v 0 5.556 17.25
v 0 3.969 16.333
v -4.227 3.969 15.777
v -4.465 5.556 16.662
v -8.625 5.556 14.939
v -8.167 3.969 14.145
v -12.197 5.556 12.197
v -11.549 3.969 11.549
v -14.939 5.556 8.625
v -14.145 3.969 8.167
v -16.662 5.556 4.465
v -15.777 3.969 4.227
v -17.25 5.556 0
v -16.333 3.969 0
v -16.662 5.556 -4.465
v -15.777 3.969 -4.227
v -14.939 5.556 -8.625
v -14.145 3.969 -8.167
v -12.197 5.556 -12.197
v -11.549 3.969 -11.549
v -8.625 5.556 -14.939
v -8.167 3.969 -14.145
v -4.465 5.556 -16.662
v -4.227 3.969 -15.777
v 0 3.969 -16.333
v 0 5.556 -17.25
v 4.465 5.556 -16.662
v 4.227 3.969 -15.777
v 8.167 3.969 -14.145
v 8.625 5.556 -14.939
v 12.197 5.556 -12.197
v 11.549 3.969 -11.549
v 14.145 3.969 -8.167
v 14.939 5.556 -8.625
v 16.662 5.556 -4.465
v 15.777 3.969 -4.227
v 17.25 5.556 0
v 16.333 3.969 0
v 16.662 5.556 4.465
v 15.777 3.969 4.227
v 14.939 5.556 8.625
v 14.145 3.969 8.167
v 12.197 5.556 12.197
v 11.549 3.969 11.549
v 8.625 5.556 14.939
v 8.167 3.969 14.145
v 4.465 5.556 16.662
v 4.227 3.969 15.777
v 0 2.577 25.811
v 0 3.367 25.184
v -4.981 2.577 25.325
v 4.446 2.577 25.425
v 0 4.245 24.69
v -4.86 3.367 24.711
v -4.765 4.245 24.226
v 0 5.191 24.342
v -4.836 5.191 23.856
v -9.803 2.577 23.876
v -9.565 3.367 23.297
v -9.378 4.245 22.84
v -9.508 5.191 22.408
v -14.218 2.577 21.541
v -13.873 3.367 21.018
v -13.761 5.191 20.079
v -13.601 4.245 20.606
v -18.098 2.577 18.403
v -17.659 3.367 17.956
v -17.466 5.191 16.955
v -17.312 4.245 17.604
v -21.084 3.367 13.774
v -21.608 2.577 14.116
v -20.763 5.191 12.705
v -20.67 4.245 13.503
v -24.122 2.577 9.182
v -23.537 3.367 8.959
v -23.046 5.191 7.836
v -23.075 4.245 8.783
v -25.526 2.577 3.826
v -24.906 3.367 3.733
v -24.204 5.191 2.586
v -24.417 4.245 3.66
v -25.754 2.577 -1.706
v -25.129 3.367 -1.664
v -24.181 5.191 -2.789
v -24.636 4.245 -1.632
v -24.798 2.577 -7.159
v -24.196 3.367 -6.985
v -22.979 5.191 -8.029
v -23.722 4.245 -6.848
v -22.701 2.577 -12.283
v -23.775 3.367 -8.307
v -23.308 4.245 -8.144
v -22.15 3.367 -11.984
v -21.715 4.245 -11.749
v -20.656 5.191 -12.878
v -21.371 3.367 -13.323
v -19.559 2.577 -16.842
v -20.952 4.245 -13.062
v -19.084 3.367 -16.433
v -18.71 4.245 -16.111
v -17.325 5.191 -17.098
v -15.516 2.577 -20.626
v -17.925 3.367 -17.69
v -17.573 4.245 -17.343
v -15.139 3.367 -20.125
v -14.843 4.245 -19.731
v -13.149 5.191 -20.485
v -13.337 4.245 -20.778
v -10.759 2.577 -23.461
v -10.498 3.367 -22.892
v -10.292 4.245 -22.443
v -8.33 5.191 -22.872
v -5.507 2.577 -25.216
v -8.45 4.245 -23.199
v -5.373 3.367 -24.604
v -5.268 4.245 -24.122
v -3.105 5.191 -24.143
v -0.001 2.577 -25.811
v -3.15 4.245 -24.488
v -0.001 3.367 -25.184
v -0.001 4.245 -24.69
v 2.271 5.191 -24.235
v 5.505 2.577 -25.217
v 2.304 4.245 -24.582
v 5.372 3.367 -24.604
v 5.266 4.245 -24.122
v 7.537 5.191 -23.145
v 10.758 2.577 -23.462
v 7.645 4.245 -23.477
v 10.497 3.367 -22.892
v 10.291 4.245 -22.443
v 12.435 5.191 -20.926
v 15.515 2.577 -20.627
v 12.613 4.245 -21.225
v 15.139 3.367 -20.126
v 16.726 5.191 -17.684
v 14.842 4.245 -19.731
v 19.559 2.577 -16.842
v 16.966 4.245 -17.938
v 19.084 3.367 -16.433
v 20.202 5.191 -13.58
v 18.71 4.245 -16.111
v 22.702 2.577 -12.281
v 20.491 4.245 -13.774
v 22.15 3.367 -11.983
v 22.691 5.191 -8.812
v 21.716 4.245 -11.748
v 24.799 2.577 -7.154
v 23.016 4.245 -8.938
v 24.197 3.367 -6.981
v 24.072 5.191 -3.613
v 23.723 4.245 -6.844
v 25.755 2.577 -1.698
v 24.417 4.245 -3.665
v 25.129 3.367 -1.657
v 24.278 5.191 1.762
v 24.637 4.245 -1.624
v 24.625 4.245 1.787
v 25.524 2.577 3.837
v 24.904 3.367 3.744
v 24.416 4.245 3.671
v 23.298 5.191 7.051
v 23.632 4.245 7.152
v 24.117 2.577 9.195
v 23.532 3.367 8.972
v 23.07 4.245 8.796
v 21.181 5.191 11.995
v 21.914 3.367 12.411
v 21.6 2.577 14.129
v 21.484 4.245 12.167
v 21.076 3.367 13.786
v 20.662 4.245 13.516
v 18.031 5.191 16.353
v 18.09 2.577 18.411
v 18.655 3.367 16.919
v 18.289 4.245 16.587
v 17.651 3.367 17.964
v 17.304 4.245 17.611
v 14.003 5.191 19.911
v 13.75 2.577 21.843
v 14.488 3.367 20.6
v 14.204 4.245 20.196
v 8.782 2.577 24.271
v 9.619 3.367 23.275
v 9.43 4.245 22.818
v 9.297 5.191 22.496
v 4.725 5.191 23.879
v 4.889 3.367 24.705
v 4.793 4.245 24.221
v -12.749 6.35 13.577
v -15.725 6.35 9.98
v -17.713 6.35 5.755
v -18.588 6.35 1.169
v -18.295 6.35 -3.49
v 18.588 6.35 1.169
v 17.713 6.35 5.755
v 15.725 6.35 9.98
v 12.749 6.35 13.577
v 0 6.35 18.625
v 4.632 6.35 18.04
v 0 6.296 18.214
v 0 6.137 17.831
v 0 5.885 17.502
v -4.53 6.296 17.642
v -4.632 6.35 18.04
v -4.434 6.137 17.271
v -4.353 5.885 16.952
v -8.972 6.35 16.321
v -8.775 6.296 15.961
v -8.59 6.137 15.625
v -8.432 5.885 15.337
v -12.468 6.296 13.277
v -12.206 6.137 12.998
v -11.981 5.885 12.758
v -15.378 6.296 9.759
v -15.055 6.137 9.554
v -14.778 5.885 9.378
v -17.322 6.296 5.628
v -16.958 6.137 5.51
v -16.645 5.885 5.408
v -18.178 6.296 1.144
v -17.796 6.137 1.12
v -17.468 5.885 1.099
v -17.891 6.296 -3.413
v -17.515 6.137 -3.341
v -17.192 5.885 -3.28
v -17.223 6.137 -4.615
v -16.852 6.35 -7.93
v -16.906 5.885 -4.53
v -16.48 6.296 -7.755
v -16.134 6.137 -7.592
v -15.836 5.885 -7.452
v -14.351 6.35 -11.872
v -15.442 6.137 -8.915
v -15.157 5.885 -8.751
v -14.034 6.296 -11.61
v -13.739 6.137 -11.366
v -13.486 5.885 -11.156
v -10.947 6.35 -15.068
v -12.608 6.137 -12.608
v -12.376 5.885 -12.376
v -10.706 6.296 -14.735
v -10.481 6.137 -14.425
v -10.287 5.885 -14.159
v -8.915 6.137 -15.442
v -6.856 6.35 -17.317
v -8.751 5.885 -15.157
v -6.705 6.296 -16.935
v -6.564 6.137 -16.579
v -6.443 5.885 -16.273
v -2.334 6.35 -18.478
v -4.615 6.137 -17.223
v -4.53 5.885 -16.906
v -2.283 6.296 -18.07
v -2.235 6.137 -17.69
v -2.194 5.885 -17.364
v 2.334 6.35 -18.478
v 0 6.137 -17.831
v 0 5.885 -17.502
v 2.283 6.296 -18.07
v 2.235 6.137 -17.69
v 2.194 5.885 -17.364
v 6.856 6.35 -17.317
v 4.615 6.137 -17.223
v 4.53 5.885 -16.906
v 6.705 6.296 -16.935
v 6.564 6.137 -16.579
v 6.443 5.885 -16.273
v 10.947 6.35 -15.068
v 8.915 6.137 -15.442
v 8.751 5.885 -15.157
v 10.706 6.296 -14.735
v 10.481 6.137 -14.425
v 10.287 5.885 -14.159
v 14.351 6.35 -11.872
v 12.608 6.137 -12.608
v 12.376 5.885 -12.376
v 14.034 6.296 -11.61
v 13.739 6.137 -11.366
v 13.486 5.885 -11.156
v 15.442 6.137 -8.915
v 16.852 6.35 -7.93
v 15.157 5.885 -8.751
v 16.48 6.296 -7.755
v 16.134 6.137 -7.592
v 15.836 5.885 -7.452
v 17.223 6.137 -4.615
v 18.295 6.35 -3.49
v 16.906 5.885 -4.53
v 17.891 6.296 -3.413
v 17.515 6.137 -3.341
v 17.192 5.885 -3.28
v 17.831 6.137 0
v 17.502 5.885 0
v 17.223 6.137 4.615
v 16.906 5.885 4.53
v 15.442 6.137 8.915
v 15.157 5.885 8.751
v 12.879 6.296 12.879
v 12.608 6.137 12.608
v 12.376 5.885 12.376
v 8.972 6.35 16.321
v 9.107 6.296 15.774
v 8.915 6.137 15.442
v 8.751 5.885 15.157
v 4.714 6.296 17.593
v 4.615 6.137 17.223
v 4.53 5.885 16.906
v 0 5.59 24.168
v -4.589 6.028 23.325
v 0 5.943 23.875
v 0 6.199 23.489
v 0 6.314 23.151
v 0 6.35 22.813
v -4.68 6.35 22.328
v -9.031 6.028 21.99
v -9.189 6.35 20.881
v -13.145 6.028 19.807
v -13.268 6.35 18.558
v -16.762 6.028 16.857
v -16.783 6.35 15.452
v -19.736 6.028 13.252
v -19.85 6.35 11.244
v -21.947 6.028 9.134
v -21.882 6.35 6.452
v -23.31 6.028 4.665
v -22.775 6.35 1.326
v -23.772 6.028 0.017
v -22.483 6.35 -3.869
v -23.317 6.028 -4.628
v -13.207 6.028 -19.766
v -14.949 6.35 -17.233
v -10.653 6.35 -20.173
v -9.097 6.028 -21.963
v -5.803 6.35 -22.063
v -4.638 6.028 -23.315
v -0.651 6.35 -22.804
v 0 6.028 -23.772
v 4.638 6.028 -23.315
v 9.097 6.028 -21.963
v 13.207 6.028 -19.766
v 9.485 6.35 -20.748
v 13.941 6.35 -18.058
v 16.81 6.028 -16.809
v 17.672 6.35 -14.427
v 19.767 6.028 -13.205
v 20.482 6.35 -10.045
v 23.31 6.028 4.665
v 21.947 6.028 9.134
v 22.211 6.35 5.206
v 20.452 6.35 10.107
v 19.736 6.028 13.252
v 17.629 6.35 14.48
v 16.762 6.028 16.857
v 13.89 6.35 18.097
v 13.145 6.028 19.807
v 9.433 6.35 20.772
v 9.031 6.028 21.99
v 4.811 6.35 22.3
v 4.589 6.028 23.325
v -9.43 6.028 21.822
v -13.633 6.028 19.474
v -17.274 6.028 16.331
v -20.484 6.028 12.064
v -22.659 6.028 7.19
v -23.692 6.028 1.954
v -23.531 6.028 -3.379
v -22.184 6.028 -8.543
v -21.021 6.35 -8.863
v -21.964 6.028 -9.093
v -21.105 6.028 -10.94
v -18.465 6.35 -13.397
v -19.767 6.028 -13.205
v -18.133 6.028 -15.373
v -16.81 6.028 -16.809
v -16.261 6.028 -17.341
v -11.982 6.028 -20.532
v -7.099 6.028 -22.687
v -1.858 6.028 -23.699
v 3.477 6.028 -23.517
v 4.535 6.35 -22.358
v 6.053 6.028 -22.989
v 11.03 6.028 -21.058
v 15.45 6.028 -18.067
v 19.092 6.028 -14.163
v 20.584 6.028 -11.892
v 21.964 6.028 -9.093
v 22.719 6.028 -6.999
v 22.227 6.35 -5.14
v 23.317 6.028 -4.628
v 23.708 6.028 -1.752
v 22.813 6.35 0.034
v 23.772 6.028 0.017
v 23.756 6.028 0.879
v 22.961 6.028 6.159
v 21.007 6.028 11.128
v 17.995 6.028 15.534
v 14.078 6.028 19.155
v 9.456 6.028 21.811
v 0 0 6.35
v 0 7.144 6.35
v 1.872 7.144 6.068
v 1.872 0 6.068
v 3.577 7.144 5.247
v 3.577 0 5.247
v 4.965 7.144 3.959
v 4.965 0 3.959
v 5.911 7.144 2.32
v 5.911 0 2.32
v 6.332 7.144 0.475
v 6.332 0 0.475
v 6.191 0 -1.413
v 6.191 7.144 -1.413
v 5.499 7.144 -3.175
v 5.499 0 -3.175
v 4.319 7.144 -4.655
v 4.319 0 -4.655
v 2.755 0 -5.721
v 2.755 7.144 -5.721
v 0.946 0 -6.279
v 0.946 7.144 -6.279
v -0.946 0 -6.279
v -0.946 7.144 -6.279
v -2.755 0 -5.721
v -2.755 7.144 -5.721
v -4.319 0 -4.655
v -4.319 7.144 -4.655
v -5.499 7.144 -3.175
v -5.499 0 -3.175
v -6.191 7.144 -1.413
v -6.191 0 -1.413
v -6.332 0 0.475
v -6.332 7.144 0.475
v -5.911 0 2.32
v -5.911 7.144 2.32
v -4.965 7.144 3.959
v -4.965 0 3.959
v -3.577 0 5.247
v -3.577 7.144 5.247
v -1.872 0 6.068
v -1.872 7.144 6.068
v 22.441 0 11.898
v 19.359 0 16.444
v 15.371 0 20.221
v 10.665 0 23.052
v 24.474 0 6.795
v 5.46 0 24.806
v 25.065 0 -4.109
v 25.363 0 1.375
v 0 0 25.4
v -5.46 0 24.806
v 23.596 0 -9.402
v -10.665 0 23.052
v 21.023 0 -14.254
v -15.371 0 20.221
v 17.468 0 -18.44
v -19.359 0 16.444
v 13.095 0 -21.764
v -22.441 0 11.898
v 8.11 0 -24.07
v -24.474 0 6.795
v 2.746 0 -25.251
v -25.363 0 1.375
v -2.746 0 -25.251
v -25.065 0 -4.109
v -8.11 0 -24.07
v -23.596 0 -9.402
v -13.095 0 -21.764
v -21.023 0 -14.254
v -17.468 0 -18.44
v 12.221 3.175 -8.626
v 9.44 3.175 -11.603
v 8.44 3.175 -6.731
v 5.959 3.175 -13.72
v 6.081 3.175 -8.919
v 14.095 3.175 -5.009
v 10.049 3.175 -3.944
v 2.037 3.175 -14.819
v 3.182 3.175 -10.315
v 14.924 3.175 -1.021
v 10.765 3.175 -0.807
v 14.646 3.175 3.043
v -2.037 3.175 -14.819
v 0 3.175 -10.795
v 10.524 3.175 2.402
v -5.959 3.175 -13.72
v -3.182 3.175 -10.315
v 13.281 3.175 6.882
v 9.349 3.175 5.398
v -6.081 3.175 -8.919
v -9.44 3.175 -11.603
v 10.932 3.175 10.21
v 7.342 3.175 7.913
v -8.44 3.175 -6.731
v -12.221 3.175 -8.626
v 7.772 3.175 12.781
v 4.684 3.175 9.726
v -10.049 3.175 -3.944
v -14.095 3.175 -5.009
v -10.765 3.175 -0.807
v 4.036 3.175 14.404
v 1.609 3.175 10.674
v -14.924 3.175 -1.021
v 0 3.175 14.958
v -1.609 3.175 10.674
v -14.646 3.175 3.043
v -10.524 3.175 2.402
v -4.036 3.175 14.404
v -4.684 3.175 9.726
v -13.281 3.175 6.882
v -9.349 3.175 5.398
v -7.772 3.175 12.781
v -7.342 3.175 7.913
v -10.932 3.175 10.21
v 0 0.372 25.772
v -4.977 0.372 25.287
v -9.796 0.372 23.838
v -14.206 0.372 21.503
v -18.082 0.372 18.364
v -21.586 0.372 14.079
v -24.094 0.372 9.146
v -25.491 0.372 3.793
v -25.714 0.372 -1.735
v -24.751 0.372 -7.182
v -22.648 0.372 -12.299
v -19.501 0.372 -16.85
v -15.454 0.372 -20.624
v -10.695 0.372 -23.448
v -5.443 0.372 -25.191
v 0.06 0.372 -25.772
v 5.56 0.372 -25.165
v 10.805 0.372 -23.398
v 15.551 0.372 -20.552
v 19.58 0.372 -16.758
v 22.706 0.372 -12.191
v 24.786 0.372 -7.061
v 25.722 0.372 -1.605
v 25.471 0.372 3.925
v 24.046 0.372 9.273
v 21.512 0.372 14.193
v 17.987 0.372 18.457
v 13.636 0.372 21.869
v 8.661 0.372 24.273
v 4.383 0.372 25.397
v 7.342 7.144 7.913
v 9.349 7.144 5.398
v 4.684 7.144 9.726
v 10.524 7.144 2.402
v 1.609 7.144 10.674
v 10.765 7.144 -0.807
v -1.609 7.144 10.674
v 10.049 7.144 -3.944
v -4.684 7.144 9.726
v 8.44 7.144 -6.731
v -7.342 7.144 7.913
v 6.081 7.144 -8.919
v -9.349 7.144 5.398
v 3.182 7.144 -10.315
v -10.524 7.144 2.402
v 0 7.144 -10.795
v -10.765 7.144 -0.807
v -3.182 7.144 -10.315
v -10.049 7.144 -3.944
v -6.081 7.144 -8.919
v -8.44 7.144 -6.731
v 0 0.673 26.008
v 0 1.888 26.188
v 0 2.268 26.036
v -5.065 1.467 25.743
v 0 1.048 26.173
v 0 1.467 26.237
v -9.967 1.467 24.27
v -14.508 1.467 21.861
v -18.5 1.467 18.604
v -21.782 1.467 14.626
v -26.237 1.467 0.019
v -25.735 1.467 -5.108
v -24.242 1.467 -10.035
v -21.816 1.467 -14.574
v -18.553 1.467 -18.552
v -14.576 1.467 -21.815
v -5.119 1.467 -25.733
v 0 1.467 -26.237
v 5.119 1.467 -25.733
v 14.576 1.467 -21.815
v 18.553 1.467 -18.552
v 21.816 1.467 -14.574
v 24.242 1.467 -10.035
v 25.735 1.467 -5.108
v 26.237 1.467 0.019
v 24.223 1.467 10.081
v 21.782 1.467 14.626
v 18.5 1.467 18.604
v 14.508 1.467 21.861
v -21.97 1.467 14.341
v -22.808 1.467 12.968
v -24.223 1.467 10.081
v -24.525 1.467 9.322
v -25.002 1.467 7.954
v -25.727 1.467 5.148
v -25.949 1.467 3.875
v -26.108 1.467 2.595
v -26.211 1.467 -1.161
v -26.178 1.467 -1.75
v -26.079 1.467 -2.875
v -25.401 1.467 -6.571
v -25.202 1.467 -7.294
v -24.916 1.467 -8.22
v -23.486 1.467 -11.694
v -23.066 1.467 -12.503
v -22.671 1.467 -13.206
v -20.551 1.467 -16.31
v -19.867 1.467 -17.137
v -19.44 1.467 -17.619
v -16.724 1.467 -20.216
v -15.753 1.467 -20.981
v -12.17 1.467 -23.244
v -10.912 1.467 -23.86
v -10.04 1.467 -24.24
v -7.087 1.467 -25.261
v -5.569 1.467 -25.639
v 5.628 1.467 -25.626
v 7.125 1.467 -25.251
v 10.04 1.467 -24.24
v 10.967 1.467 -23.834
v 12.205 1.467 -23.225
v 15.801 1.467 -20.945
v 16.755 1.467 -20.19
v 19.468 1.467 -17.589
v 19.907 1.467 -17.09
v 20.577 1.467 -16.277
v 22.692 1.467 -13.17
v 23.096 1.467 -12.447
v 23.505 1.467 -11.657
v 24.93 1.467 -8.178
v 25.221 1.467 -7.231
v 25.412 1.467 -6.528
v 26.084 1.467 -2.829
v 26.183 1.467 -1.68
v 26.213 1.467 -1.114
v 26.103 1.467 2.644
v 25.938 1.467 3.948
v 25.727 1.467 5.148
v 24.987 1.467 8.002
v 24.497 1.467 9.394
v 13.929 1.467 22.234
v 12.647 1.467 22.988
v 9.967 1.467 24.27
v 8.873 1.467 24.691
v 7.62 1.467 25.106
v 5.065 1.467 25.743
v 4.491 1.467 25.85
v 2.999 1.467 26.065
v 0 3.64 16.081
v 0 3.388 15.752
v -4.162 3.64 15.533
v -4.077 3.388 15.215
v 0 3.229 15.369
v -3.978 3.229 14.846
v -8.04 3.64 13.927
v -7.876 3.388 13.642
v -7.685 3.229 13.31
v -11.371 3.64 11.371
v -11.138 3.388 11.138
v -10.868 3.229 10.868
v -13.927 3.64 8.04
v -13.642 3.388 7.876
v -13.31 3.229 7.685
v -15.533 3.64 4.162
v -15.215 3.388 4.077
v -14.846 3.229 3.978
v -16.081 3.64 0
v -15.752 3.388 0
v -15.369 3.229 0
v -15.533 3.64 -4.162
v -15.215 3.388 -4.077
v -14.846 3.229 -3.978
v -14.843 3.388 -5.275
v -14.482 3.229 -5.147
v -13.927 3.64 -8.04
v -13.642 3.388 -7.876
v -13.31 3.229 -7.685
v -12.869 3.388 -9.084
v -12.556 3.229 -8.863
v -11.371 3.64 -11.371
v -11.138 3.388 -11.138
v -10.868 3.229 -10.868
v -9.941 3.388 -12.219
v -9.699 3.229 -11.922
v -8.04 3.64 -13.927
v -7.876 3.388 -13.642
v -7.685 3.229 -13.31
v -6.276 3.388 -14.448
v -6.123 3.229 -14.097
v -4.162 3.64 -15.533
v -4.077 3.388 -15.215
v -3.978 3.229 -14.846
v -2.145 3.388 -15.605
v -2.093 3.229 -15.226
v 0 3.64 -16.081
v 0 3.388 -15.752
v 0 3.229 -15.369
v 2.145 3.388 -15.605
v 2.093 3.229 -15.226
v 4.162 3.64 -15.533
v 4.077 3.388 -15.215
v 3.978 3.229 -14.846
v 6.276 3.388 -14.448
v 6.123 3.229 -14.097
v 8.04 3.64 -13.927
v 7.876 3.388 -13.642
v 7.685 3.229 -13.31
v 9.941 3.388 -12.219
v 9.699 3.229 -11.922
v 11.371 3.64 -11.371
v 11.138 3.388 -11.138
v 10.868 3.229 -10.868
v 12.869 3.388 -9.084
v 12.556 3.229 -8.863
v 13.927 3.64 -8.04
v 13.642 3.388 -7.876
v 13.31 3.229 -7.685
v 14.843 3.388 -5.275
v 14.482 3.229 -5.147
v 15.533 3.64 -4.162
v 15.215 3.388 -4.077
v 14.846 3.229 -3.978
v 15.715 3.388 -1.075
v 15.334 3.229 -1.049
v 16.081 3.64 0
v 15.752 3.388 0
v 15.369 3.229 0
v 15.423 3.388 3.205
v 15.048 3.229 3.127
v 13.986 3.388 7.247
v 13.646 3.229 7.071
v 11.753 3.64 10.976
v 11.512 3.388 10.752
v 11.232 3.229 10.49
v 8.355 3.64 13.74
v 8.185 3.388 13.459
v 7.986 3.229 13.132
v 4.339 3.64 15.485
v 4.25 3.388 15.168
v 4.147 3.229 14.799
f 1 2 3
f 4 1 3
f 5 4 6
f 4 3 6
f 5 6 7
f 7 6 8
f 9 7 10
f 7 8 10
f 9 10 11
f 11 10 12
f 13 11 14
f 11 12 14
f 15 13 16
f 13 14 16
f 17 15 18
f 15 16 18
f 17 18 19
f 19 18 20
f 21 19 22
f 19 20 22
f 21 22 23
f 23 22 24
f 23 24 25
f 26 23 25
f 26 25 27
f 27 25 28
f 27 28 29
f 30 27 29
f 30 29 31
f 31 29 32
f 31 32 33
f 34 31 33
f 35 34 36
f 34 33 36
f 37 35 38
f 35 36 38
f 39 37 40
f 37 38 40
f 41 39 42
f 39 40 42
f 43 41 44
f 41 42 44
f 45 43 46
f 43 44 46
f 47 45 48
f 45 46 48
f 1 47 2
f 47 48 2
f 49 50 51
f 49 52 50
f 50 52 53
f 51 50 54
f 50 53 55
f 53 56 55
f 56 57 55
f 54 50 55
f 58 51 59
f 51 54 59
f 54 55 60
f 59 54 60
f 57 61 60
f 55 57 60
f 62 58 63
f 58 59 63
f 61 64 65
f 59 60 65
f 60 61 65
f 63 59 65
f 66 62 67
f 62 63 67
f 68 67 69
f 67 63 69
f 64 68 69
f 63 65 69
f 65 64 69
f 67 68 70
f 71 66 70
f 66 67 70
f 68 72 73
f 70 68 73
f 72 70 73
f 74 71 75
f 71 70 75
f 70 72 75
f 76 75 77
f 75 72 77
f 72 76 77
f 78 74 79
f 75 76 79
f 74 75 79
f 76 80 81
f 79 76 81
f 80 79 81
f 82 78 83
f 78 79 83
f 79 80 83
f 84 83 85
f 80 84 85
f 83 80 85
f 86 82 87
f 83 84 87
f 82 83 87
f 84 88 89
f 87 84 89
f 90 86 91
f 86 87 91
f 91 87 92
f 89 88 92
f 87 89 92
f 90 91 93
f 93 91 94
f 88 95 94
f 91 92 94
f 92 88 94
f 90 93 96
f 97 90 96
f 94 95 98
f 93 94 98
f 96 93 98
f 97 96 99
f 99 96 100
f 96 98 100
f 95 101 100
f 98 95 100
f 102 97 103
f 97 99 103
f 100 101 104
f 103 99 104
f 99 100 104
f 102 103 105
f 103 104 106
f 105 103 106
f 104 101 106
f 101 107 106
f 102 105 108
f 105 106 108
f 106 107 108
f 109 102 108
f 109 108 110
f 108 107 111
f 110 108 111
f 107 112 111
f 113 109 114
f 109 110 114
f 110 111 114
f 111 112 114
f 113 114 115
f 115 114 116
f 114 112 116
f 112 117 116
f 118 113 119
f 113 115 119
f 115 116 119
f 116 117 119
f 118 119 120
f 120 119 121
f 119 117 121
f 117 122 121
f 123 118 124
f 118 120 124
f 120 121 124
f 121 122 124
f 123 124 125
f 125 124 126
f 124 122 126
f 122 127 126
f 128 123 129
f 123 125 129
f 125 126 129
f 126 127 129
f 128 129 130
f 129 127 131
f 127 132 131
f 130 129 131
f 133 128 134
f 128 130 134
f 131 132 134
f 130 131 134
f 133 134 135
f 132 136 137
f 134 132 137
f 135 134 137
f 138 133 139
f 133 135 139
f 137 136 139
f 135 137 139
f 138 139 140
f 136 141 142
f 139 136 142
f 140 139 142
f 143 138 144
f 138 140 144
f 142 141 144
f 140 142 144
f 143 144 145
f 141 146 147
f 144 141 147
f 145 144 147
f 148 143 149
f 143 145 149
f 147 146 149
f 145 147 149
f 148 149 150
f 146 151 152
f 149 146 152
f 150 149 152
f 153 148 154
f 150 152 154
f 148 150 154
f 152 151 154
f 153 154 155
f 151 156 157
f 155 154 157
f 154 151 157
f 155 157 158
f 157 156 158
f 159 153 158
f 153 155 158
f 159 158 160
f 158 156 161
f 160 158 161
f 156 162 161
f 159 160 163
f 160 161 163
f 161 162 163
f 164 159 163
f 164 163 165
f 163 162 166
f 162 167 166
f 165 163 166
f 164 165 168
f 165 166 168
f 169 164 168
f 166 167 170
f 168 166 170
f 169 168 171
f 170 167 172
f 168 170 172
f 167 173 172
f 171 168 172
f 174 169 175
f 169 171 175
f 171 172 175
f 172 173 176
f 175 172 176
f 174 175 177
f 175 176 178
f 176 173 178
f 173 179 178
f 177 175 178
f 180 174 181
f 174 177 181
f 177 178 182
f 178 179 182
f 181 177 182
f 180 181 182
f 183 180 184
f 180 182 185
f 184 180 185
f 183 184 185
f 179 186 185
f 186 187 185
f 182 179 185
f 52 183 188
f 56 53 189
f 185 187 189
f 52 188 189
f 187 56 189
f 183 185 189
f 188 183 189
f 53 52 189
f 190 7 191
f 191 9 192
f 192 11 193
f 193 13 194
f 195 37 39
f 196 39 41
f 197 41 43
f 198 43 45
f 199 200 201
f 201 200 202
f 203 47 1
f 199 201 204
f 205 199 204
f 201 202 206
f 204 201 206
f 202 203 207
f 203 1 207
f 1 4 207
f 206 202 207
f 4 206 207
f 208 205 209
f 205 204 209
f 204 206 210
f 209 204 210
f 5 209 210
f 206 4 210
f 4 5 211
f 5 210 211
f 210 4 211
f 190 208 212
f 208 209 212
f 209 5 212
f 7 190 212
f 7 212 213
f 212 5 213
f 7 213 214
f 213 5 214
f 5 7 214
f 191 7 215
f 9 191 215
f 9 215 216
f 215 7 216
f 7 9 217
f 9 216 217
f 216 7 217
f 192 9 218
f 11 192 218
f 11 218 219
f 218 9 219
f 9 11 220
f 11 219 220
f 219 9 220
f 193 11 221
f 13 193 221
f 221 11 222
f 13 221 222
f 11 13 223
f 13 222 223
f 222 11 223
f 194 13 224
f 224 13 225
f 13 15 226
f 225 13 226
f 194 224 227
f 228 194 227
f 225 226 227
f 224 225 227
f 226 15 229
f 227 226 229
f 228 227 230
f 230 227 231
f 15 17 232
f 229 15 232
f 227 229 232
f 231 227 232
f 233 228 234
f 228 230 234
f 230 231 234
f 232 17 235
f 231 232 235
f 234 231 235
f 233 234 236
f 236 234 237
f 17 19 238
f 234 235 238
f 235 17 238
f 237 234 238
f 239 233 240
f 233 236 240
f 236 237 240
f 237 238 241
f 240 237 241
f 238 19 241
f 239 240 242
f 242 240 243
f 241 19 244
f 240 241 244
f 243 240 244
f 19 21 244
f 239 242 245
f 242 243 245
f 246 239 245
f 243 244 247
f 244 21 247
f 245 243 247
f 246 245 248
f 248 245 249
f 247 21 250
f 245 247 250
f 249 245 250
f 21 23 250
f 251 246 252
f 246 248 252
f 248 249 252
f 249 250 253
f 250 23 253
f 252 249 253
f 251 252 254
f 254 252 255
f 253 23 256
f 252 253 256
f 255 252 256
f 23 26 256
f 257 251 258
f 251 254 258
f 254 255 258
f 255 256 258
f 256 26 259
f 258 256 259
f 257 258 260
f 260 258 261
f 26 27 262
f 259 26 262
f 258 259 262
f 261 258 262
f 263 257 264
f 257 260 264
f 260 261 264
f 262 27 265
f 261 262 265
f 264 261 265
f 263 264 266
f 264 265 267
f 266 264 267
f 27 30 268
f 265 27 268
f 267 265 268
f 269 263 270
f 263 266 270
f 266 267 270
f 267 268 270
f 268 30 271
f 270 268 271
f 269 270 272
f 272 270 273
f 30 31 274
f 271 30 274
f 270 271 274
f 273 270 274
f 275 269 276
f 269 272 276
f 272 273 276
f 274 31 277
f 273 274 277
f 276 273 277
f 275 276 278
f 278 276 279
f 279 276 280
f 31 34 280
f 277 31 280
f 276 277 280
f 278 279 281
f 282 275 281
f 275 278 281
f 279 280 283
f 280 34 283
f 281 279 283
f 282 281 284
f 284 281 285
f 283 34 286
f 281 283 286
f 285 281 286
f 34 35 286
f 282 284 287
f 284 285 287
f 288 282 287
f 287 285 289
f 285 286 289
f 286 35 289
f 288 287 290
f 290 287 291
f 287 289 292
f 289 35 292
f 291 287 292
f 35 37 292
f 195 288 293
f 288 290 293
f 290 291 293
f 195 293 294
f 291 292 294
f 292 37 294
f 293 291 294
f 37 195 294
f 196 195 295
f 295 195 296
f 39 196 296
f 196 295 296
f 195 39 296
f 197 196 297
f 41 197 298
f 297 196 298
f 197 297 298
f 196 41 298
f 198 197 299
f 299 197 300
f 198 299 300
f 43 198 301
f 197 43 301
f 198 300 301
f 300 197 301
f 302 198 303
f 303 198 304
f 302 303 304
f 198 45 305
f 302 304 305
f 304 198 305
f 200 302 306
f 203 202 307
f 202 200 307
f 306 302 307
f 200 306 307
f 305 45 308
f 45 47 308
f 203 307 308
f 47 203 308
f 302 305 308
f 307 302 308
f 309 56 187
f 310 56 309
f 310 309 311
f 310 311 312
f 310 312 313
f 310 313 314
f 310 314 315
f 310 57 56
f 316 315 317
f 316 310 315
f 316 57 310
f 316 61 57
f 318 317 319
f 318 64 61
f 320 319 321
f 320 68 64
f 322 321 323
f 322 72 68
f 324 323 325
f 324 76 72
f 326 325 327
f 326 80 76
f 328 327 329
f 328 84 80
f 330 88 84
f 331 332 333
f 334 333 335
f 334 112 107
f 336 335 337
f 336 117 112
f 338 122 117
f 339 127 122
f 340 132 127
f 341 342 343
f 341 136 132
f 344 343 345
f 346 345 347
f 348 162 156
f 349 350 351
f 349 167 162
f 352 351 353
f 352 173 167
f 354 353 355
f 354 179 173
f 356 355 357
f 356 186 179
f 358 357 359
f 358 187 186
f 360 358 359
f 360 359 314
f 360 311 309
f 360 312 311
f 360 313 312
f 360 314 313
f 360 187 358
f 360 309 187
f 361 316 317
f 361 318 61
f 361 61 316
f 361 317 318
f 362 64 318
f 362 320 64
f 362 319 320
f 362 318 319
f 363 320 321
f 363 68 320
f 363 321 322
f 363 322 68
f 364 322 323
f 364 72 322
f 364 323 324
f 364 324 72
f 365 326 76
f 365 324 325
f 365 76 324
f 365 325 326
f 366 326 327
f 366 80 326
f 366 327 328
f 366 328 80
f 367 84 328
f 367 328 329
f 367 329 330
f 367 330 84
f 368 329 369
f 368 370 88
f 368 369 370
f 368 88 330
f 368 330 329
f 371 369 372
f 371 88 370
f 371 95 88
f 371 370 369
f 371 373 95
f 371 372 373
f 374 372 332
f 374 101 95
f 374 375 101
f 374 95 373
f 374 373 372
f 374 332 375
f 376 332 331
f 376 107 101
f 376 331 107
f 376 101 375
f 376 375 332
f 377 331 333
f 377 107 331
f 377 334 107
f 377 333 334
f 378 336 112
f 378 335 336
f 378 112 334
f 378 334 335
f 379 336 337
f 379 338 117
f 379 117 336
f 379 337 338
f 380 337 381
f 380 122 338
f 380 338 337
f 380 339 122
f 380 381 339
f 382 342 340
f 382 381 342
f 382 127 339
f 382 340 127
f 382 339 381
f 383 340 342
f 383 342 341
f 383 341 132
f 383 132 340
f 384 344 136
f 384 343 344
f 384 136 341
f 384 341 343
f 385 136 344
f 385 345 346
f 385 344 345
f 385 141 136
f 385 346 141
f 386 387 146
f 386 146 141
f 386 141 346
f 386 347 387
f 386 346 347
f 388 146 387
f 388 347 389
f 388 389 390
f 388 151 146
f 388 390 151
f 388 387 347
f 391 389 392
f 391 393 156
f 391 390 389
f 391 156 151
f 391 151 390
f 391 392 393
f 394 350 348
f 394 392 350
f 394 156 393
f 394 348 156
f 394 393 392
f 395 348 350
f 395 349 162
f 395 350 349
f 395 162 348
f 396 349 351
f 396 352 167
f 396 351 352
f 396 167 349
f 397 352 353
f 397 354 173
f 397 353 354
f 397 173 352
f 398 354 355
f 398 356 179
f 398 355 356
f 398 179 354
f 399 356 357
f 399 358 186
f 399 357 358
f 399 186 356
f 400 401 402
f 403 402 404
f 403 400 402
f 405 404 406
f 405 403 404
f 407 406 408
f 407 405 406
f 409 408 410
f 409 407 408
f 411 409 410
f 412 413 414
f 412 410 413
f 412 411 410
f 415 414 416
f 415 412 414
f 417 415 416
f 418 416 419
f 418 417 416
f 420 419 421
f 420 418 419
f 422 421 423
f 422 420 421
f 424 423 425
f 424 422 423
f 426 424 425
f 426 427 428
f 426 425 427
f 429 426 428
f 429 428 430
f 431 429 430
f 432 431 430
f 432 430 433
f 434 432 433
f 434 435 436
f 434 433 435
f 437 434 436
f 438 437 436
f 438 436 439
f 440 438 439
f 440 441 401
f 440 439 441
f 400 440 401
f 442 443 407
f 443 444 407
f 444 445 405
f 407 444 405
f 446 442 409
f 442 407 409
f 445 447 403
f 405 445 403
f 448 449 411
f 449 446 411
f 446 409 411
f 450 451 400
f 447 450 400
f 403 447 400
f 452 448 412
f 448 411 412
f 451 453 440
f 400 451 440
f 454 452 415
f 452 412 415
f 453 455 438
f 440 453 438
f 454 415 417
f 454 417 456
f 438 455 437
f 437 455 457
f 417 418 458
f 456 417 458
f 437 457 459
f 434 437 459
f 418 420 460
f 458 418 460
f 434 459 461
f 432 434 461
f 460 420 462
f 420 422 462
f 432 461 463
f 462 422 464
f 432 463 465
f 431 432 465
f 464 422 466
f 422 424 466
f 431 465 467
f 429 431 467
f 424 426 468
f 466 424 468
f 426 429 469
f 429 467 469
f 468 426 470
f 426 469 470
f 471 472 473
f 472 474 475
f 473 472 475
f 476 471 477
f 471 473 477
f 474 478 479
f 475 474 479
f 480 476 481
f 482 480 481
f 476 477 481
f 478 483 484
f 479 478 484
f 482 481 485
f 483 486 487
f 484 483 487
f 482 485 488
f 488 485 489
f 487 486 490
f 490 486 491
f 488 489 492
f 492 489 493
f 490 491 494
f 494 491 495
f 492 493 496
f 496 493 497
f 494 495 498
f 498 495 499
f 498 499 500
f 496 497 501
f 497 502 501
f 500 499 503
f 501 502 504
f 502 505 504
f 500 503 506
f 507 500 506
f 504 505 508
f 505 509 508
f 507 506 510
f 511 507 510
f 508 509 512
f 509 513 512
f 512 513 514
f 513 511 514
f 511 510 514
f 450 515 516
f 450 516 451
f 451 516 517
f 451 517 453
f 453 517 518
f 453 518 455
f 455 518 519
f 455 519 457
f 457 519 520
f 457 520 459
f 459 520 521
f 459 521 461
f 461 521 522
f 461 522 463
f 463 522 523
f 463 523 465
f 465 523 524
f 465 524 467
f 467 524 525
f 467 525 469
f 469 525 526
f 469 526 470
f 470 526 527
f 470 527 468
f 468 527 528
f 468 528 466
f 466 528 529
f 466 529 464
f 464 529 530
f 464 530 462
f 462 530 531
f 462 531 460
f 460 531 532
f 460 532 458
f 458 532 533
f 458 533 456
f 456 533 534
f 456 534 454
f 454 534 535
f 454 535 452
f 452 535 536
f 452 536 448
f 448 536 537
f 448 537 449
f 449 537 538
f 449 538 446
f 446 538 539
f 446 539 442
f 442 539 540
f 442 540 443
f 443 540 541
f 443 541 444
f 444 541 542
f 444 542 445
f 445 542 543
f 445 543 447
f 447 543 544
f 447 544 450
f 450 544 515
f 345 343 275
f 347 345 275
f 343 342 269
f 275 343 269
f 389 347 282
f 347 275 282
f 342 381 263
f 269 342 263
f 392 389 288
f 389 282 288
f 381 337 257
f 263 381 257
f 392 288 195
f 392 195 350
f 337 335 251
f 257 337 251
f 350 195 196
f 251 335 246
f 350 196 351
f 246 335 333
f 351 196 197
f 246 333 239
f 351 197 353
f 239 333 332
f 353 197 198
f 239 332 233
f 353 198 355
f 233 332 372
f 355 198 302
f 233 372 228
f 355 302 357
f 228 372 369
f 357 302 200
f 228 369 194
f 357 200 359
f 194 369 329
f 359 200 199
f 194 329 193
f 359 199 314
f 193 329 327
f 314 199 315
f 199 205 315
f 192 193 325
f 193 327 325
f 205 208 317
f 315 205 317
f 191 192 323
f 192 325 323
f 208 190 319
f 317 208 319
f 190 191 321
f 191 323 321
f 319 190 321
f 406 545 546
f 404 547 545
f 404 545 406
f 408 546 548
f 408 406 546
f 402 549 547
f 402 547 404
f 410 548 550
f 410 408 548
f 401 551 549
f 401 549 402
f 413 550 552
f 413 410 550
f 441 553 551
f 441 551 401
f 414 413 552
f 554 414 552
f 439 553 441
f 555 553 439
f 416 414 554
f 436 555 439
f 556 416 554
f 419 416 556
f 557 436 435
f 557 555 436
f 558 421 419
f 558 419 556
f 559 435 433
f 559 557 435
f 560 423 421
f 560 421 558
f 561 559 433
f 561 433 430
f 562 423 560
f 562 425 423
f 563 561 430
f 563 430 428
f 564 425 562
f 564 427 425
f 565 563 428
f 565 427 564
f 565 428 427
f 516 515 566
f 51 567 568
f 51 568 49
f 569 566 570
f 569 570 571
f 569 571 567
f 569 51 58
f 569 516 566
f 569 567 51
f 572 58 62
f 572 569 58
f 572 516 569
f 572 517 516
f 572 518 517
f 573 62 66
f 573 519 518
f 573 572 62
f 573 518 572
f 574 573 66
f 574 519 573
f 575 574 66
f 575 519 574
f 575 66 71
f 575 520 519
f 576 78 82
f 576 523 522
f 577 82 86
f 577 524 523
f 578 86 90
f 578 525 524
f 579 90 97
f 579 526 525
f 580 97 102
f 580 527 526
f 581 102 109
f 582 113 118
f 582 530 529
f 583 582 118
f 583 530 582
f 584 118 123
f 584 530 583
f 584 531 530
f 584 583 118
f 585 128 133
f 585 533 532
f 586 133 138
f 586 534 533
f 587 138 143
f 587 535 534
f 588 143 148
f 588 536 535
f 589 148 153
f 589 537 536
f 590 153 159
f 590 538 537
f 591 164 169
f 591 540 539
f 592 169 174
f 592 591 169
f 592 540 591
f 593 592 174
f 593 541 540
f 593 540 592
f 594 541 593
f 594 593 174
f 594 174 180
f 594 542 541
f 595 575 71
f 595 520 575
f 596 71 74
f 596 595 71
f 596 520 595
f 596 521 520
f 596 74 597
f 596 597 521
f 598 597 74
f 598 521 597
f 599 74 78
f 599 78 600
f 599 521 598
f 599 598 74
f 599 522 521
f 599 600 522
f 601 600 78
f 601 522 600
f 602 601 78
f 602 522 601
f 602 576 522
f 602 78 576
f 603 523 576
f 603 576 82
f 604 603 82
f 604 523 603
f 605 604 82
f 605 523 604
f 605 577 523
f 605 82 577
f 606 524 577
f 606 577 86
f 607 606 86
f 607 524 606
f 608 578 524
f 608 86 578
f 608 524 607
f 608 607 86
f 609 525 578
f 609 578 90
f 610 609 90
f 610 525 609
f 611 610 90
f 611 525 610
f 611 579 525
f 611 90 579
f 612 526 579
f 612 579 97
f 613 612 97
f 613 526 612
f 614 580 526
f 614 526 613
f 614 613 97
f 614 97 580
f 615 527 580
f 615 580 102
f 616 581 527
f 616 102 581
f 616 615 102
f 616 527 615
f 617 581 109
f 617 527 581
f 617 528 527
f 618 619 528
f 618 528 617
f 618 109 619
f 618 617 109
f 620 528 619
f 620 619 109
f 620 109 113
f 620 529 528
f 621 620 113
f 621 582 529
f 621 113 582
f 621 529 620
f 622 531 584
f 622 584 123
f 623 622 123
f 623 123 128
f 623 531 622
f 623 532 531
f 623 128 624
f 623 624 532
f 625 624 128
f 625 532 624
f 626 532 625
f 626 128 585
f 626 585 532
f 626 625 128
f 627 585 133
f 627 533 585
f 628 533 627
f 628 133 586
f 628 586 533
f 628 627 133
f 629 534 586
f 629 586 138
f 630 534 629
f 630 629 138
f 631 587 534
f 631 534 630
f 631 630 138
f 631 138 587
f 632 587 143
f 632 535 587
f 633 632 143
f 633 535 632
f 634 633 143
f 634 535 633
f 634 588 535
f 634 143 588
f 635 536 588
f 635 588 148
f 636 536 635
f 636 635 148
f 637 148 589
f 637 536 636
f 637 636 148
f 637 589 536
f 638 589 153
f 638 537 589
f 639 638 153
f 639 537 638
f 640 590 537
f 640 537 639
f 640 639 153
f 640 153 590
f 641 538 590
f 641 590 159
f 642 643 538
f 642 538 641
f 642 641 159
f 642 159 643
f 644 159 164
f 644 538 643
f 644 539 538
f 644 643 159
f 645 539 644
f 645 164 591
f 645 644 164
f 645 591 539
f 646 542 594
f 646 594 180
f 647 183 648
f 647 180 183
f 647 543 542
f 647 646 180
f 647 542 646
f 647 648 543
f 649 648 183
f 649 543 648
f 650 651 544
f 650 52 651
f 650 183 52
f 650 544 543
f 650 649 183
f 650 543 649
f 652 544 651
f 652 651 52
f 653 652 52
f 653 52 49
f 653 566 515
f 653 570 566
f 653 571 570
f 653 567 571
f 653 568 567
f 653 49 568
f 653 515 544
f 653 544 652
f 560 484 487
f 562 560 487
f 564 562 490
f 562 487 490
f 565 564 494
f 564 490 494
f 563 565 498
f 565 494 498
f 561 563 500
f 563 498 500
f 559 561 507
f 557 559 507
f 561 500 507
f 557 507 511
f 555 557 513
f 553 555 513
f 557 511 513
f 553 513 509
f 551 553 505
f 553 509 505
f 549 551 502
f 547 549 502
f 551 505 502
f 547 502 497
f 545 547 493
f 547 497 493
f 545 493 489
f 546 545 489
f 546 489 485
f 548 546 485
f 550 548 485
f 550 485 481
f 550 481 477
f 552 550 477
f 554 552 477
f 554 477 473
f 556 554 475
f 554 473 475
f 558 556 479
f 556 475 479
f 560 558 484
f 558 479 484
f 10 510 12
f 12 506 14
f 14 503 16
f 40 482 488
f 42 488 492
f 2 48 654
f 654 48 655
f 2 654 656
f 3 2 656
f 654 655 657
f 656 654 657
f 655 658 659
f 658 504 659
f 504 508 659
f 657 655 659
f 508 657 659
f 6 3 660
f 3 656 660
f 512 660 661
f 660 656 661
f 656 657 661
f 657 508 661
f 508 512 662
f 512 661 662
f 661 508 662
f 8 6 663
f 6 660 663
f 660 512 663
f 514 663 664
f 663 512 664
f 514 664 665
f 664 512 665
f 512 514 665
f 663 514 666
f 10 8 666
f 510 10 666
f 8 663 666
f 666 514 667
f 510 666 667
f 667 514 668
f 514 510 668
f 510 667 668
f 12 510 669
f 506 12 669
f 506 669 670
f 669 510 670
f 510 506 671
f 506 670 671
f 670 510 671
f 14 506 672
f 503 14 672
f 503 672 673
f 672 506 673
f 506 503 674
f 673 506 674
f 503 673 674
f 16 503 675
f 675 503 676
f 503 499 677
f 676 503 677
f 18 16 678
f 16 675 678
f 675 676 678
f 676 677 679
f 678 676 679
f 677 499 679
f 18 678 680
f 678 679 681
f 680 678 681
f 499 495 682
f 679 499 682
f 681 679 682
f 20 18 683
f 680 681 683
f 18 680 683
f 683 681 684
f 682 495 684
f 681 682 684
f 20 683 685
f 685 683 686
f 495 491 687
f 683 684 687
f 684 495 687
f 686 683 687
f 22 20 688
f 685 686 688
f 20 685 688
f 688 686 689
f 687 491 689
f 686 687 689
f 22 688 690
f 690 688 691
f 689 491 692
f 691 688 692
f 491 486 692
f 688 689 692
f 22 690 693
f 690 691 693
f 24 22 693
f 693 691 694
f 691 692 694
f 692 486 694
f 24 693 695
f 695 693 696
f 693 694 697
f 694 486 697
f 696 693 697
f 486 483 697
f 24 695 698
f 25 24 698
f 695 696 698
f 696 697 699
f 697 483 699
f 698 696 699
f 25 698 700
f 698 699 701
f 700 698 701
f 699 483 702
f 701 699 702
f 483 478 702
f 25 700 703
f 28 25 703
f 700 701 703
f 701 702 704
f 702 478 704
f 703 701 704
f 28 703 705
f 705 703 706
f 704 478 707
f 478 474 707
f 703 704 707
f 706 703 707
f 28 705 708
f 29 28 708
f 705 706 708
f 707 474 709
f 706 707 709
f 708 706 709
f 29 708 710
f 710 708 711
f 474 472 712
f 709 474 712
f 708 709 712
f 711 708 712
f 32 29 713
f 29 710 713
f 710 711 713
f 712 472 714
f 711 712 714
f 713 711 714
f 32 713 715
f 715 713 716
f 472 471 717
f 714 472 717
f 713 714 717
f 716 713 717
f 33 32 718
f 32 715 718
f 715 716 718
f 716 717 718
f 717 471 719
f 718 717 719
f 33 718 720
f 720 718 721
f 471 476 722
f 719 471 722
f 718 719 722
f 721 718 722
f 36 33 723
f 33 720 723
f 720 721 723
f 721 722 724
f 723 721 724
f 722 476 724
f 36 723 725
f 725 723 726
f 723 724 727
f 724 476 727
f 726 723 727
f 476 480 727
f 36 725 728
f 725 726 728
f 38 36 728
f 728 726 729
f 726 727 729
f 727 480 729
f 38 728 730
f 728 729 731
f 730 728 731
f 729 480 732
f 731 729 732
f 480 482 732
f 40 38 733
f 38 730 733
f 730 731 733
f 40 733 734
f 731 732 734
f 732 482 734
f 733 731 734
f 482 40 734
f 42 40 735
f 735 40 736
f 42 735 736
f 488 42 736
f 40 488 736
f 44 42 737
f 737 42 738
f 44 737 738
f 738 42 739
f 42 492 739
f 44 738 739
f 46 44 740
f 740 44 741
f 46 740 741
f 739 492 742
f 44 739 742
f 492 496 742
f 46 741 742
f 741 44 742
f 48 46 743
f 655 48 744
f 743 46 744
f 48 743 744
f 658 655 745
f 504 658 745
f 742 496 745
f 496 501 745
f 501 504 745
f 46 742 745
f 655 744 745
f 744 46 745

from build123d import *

# Parameters (mm, degrees)
FILLET1_R        = 1.5875
SKETCH2_R        = 10.795
ROUND_BOSS_DEPTH = 3.96875
SKETCH4_R        = 6.35
HOLE_DEPTH       = 6.35
MODULAR_REACH    = 39.644
SKETCH12_R       = 6.35


with BuildPart() as part:
    # Sketch1 → Base-Revolve (revolve)
    with BuildSketch(Plane.XY, mode=Mode.PRIVATE) as base_revolve_sk:
        with BuildLine():
            Line((0, 0), (25.4, 0))
            Line((25.4, 0), (26.9875, 1.5875))
            ThreePointArc((26.9875, 1.5875), (25.010459227, 3.639775536), (24.13, 6.35))
            Line((24.13, 6.35), (17.708087105, 6.35))
            Line((17.708087105, 6.35), (15.875, 3.175))
            Line((15.875, 3.175), (0, 3.175))
            Line((0, 3.175), (0, 0))
        make_face()
    revolve(base_revolve_sk.sketch.rotate(Axis((0, 4.772511252, 0), (0, -1, 0)), 90), axis=Axis((0, 4.772511252, 0), (0, -1, 0)))

    # Fillet1
    fillet1_edges = [part.edges().sort_by_distance(p)[0] for p in [
        (0, 3.175, -15.875),
        (0, 6.35, -17.708087105),
        (0, 6.35, -24.13),
        (0, 1.5875, -26.9875),
    ]]
    fillet(fillet1_edges, radius=FILLET1_R)

    # Sketch2 → Round Boss (add)
    with BuildSketch(Plane(origin=(0, 3.175, 0), x_dir=(-1, 0, 0), z_dir=(0, 1, 0))):
        with Locations(Location((0, 0, 0), (0, 0, 270))):
            Circle(SKETCH2_R)
    extrude(amount=ROUND_BOSS_DEPTH)

    # Sketch4 → hole (cut)
    with BuildSketch(Plane(origin=(0, 0, 0), x_dir=(-1, 0, 0), z_dir=(0, 1, 0))):
        with Locations(Location((0, 0, 0), (0, 0, 90))):
            Circle(SKETCH4_R)
    extrude(amount=HOLE_DEPTH, mode=Mode.SUBTRACT)

    # Sketch12 → Modular (cut, up to next)
    with BuildSketch(Plane(origin=(0, 6.35, 0), x_dir=(-1, 0, 0), z_dir=(0, 1, 0)), mode=Mode.PRIVATE) as modular_sk1:
        with Locations(Location((0, 0, 0), (0, 0, 90))):
            Circle(SKETCH12_R)
    modular_tool1 = extrude(modular_sk1.sketch, amount=MODULAR_REACH, mode=Mode.PRIVATE) & part.part
    add(modular_tool1.solids().sort_by_distance((0, 6.35, 0))[0], mode=Mode.SUBTRACT)


solid = part.part
